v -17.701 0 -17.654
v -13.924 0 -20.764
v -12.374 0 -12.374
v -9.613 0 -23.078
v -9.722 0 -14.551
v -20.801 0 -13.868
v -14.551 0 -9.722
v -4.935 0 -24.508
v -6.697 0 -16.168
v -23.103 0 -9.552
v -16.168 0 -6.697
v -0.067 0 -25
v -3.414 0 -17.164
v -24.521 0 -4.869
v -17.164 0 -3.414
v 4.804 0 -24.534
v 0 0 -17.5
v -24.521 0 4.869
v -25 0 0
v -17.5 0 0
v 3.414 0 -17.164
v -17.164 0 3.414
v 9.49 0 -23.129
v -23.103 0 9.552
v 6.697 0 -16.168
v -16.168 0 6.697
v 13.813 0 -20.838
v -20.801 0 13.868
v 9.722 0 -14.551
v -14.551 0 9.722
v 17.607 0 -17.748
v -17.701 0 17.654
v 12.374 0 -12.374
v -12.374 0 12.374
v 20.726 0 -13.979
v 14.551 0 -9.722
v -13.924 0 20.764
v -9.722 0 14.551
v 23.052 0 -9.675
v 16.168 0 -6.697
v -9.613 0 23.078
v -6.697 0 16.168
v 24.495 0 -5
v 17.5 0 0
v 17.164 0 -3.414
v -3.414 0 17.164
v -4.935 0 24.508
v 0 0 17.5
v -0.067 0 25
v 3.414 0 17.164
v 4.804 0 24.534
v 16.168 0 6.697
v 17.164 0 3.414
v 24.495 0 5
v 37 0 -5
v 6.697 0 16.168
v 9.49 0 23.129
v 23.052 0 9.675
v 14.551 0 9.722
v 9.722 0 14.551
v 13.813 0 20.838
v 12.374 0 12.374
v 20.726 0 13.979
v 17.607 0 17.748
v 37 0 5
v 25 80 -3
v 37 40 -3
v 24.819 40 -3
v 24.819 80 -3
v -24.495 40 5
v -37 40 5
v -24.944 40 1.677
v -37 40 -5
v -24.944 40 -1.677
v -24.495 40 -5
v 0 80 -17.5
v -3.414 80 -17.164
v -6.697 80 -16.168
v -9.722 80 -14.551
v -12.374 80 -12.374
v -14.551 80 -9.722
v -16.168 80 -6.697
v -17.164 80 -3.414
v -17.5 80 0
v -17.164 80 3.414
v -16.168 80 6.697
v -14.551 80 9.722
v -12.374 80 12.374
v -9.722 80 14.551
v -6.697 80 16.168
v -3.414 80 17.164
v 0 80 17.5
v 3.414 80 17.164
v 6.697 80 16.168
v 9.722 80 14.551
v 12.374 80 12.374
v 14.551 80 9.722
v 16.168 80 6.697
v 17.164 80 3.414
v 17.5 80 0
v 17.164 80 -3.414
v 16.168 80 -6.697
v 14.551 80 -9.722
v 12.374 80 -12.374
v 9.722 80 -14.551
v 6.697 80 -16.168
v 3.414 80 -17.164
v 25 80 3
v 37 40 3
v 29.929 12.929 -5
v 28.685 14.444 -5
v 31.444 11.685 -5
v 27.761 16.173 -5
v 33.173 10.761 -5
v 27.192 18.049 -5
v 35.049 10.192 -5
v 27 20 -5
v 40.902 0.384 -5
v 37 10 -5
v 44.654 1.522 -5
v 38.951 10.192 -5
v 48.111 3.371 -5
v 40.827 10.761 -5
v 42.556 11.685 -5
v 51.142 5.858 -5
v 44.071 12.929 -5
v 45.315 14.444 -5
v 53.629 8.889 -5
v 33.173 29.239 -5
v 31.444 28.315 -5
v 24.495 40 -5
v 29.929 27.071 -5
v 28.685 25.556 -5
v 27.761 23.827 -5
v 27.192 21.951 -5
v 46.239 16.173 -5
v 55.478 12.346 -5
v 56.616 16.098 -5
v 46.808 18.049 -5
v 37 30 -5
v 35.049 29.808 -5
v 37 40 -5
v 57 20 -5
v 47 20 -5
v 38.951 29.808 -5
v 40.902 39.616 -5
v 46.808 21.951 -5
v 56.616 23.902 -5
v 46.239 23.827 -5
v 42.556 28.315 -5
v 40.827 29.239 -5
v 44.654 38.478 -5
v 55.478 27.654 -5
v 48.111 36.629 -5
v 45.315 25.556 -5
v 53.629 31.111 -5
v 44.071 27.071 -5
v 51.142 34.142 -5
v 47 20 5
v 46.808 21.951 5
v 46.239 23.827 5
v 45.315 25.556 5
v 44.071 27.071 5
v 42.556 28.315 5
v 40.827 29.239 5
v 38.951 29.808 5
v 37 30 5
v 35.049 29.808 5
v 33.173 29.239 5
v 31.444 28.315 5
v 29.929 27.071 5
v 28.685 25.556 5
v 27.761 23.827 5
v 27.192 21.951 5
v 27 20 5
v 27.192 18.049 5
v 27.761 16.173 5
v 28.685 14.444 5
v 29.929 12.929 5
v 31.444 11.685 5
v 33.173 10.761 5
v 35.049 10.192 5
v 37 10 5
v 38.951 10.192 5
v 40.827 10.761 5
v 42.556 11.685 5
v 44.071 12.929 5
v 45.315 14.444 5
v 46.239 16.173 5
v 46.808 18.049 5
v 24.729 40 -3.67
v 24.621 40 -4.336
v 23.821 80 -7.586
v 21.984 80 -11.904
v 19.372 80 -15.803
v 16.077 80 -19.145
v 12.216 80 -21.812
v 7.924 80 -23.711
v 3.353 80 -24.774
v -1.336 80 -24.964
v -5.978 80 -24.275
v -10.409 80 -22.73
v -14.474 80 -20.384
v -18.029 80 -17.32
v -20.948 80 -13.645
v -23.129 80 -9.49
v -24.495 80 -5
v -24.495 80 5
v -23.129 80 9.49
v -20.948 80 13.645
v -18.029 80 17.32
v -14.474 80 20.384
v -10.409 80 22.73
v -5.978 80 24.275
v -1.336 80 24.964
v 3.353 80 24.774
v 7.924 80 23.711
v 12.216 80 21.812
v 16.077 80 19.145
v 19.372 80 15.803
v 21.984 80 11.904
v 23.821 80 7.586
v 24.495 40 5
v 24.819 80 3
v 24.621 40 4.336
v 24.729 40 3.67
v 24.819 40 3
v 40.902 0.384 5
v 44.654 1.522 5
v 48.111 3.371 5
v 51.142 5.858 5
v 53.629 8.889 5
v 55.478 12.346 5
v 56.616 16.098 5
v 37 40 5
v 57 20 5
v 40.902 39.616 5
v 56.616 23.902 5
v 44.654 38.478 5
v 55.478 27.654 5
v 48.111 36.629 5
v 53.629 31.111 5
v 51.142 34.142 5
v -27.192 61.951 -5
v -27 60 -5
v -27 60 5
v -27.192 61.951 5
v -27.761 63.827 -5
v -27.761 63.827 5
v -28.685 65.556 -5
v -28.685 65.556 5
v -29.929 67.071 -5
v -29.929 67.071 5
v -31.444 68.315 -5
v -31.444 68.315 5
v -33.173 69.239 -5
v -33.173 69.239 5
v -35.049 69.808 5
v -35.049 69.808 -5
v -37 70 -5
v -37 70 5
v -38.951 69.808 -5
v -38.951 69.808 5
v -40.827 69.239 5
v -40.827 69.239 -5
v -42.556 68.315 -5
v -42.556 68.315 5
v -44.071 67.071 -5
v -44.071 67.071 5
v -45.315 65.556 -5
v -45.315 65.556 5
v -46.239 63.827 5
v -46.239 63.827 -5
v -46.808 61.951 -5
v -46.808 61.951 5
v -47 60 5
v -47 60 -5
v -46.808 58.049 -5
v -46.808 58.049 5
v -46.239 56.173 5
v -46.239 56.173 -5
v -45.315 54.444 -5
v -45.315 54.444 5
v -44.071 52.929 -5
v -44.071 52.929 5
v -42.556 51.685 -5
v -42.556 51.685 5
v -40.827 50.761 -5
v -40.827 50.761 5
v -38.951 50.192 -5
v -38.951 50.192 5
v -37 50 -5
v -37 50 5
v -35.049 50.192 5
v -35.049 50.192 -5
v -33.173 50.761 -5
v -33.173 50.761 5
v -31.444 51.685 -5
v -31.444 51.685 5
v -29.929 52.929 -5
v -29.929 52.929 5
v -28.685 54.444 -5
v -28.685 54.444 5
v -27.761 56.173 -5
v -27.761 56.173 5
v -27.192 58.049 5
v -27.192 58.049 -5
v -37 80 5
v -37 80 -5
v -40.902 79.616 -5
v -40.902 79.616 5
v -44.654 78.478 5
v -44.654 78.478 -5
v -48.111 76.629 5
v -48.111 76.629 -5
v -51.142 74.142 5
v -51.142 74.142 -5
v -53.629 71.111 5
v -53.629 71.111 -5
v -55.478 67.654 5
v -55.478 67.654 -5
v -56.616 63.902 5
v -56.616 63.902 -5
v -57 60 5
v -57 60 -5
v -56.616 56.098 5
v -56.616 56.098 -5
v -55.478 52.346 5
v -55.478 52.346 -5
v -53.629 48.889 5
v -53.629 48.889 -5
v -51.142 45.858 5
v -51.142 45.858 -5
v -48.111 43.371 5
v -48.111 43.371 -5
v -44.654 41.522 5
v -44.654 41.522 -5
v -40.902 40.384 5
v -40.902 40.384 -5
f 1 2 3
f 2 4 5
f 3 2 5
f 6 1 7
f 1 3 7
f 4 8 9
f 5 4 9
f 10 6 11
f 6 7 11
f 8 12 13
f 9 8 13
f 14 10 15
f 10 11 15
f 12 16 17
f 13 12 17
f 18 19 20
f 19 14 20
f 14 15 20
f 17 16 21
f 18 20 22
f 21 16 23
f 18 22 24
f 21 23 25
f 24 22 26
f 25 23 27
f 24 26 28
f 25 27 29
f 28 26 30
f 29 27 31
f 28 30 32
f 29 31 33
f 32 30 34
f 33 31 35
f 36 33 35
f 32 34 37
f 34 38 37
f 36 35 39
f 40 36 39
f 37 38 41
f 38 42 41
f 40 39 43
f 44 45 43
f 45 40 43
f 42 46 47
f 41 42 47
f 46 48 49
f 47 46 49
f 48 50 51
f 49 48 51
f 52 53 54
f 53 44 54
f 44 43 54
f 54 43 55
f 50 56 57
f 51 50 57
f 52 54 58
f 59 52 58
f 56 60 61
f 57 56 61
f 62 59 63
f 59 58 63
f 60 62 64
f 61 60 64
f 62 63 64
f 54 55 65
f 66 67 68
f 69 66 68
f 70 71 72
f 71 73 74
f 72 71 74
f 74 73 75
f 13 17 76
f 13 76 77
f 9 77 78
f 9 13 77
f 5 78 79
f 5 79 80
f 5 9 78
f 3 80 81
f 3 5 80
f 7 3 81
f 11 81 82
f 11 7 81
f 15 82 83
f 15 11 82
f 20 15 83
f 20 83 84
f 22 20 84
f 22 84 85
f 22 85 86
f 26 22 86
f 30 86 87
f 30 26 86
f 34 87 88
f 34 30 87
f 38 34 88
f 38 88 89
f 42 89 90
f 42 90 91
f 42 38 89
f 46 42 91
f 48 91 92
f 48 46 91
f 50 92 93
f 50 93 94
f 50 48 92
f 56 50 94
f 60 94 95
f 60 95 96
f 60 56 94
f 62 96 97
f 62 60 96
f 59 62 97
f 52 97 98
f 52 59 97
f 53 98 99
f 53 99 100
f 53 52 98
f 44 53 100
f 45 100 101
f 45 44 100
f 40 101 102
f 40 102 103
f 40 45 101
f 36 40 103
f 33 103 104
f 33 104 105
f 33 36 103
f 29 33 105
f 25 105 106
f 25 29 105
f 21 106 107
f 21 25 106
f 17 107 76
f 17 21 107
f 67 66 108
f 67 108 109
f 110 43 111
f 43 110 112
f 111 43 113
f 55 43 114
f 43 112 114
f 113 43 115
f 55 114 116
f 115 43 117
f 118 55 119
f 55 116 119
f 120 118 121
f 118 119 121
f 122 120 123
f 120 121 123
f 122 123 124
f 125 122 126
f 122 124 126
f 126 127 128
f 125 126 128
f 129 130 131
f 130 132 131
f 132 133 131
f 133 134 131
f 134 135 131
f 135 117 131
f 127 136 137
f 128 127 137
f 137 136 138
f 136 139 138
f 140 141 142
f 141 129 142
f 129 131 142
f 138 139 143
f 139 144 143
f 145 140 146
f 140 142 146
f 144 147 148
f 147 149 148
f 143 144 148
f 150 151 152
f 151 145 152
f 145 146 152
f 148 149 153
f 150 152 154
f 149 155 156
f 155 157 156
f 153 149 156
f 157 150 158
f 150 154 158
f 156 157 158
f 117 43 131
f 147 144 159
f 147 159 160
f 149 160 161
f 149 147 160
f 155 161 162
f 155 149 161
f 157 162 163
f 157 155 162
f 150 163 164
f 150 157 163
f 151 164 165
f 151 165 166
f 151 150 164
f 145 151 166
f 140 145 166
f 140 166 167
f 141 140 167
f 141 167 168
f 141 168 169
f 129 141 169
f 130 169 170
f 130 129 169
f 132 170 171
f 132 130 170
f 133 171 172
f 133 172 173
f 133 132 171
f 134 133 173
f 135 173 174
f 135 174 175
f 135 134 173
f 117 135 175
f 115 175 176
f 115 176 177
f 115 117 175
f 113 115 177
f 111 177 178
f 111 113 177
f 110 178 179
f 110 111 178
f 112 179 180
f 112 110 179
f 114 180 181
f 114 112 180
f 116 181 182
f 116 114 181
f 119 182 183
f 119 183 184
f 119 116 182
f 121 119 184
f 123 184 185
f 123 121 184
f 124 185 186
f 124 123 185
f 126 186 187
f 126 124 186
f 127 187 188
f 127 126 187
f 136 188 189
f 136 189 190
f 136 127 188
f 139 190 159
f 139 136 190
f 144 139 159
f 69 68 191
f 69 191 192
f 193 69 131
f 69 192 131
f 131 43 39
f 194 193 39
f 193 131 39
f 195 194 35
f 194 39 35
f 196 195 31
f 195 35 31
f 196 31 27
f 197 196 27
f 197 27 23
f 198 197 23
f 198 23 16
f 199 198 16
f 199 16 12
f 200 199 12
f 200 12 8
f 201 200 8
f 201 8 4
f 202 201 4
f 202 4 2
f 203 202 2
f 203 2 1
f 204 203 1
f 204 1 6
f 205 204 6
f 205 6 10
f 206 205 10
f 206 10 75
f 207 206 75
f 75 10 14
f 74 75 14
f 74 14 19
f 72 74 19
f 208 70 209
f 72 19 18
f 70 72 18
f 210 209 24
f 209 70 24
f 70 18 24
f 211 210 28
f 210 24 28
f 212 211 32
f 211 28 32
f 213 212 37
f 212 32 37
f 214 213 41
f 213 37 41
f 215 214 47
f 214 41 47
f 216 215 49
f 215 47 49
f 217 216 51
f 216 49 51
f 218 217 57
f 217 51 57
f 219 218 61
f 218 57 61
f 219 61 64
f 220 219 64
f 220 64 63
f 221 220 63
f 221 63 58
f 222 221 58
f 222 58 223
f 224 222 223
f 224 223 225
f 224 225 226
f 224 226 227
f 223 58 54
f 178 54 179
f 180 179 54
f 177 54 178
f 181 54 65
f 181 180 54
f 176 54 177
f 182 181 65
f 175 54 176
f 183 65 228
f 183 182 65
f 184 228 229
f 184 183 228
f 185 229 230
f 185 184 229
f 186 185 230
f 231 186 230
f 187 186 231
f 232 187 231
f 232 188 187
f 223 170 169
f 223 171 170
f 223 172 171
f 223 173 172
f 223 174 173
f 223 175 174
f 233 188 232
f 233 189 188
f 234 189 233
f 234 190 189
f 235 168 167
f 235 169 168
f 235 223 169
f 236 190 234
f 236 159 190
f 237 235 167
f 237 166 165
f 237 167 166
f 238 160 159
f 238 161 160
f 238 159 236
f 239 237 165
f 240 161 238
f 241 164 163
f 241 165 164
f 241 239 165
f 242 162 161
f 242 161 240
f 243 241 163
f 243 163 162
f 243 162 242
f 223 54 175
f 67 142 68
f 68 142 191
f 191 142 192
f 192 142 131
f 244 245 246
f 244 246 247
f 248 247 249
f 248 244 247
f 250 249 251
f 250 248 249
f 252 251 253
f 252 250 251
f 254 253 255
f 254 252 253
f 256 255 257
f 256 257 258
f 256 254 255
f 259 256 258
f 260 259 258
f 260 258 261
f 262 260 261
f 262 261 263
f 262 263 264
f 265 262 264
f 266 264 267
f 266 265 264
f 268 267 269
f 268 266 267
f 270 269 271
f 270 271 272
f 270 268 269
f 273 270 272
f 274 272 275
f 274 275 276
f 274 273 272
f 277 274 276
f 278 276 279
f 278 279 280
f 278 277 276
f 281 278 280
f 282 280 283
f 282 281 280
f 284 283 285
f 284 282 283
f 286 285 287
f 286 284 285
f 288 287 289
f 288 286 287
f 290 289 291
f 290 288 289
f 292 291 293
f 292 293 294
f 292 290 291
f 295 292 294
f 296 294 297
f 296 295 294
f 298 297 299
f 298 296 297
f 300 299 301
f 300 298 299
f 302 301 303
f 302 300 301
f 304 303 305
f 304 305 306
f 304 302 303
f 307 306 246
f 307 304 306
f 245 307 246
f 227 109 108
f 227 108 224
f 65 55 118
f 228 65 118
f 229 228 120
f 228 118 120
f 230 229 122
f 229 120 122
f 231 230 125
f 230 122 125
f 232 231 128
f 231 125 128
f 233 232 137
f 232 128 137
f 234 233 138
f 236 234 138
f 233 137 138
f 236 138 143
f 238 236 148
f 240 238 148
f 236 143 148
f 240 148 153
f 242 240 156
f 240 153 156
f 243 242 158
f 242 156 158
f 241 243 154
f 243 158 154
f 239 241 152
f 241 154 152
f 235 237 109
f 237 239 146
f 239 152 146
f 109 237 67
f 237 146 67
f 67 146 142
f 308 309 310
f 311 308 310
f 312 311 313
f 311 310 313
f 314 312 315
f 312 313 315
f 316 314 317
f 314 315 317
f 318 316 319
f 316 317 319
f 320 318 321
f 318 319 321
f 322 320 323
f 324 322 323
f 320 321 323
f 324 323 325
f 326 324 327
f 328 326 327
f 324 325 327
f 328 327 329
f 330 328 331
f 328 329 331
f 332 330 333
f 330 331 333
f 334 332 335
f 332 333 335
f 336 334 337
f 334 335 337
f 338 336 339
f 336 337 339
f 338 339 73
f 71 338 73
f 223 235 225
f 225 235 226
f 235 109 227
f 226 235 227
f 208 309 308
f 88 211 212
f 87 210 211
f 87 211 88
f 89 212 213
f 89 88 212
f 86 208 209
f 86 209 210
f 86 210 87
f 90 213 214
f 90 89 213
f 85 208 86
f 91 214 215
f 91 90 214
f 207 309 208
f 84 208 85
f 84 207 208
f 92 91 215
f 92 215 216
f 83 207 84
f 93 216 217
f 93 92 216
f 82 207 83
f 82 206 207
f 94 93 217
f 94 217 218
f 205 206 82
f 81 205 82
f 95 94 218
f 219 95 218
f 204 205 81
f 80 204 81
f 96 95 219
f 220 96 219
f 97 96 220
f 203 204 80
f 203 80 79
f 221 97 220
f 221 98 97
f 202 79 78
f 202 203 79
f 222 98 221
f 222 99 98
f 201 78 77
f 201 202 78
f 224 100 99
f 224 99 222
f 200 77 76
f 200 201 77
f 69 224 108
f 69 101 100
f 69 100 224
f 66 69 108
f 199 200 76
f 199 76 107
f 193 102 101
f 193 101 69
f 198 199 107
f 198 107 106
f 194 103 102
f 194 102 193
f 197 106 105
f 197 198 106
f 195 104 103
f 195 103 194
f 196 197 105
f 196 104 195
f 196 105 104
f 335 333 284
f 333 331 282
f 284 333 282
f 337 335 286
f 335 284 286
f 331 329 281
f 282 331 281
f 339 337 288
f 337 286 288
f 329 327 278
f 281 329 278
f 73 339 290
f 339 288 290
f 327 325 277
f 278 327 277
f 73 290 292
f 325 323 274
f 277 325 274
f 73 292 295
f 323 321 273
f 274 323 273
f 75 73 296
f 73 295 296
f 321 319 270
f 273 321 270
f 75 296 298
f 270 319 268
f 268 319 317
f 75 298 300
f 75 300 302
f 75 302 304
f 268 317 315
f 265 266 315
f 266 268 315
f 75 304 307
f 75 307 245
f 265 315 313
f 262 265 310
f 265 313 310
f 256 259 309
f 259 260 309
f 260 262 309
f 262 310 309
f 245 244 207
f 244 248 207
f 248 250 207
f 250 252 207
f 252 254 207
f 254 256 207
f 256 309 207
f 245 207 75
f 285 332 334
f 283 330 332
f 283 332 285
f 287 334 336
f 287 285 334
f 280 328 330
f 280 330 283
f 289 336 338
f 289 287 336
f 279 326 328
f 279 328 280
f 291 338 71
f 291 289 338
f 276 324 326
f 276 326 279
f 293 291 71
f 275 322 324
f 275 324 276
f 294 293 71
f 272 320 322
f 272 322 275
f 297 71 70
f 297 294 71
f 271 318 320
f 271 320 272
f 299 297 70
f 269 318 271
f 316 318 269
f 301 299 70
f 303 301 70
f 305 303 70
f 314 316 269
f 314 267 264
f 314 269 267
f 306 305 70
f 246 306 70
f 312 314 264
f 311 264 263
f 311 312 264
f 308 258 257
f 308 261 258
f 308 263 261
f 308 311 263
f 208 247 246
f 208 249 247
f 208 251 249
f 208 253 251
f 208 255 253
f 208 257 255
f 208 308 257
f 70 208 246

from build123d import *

# Parameters (mm, degrees)
SKETCH1_R                = 25
BOSS_EXTRUDE1_DEPTH      = 80
BOSS_EXTRUDE2_DEPTH      = 5
BOSS_EXTRUDE2_DEPTH_BACK = 5
SKETCH2_R                = 10
BOSS_EXTRUDE3_DEPTH      = 5
BOSS_EXTRUDE3_DEPTH_BACK = 5
SKETCH3_R                = 10
BOSS_EXTRUDE4_DEPTH      = 3
BOSS_EXTRUDE4_DEPTH_BACK = 3
SKETCH5_R                = 17.5
CUT_EXTRUDE10_DEPTH      = 80


with BuildPart() as part:
    # Sketch1 → Boss-Extrude1 (new body)
    with BuildSketch(Plane(origin=(0, 0, 0), x_dir=(1, 0, 0), z_dir=(0, 1, 0))):
        Circle(SKETCH1_R)
    extrude(amount=BOSS_EXTRUDE1_DEPTH)

    # Sketch2 → Boss-Extrude2 (add, two sides: drawn at the far end of the back side and taken through both)
    with BuildSketch(Plane.XY.offset(-BOSS_EXTRUDE2_DEPTH_BACK)):
        with BuildLine():
            Line((0, 80), (-37, 80))
            ThreePointArc((-37, 80), (-57, 60), (-37, 40))
            Line((-37, 40), (0, 40))
            Line((0, 40), (0, 80))
        make_face()
        with Locations((-37, 60)):
            Circle(SKETCH2_R, mode=Mode.SUBTRACT)
    extrude(amount=BOSS_EXTRUDE2_DEPTH + BOSS_EXTRUDE2_DEPTH_BACK)

    # Sketch3 → Boss-Extrude3 (add, two sides: drawn at the far end of the back side and taken through both)
    with BuildSketch(Plane.XY.offset(-BOSS_EXTRUDE3_DEPTH_BACK)):
        with BuildLine():
            Line((0, 0), (37, 0))
            ThreePointArc((37, 0), (57, 20), (37, 40))
            Line((37, 40), (0, 40))
            Line((0, 40), (0, 0))
        make_face()
        with Locations((37, 20)):
            Circle(SKETCH3_R, mode=Mode.SUBTRACT)
    extrude(amount=BOSS_EXTRUDE3_DEPTH + BOSS_EXTRUDE3_DEPTH_BACK)

    # Sketch4 → Boss-Extrude4 (add, two sides: drawn at the far end of the back side and taken through both)
    with BuildSketch(Plane.XY.offset(-BOSS_EXTRUDE4_DEPTH_BACK)):
        Polygon((25, 80), (37, 40), (0.252551286, 40), (0.252551286, 80), align=None)
    extrude(amount=BOSS_EXTRUDE4_DEPTH + BOSS_EXTRUDE4_DEPTH_BACK)

    # Sketch5 → Cut-Extrude10 (cut)
    with BuildSketch(Plane(origin=(0, 0, 0), x_dir=(1, 0, 0), z_dir=(0, 1, 0))):
        Circle(SKETCH5_R)
    extrude(amount=CUT_EXTRUDE10_DEPTH, mode=Mode.SUBTRACT)


solid = part.part
